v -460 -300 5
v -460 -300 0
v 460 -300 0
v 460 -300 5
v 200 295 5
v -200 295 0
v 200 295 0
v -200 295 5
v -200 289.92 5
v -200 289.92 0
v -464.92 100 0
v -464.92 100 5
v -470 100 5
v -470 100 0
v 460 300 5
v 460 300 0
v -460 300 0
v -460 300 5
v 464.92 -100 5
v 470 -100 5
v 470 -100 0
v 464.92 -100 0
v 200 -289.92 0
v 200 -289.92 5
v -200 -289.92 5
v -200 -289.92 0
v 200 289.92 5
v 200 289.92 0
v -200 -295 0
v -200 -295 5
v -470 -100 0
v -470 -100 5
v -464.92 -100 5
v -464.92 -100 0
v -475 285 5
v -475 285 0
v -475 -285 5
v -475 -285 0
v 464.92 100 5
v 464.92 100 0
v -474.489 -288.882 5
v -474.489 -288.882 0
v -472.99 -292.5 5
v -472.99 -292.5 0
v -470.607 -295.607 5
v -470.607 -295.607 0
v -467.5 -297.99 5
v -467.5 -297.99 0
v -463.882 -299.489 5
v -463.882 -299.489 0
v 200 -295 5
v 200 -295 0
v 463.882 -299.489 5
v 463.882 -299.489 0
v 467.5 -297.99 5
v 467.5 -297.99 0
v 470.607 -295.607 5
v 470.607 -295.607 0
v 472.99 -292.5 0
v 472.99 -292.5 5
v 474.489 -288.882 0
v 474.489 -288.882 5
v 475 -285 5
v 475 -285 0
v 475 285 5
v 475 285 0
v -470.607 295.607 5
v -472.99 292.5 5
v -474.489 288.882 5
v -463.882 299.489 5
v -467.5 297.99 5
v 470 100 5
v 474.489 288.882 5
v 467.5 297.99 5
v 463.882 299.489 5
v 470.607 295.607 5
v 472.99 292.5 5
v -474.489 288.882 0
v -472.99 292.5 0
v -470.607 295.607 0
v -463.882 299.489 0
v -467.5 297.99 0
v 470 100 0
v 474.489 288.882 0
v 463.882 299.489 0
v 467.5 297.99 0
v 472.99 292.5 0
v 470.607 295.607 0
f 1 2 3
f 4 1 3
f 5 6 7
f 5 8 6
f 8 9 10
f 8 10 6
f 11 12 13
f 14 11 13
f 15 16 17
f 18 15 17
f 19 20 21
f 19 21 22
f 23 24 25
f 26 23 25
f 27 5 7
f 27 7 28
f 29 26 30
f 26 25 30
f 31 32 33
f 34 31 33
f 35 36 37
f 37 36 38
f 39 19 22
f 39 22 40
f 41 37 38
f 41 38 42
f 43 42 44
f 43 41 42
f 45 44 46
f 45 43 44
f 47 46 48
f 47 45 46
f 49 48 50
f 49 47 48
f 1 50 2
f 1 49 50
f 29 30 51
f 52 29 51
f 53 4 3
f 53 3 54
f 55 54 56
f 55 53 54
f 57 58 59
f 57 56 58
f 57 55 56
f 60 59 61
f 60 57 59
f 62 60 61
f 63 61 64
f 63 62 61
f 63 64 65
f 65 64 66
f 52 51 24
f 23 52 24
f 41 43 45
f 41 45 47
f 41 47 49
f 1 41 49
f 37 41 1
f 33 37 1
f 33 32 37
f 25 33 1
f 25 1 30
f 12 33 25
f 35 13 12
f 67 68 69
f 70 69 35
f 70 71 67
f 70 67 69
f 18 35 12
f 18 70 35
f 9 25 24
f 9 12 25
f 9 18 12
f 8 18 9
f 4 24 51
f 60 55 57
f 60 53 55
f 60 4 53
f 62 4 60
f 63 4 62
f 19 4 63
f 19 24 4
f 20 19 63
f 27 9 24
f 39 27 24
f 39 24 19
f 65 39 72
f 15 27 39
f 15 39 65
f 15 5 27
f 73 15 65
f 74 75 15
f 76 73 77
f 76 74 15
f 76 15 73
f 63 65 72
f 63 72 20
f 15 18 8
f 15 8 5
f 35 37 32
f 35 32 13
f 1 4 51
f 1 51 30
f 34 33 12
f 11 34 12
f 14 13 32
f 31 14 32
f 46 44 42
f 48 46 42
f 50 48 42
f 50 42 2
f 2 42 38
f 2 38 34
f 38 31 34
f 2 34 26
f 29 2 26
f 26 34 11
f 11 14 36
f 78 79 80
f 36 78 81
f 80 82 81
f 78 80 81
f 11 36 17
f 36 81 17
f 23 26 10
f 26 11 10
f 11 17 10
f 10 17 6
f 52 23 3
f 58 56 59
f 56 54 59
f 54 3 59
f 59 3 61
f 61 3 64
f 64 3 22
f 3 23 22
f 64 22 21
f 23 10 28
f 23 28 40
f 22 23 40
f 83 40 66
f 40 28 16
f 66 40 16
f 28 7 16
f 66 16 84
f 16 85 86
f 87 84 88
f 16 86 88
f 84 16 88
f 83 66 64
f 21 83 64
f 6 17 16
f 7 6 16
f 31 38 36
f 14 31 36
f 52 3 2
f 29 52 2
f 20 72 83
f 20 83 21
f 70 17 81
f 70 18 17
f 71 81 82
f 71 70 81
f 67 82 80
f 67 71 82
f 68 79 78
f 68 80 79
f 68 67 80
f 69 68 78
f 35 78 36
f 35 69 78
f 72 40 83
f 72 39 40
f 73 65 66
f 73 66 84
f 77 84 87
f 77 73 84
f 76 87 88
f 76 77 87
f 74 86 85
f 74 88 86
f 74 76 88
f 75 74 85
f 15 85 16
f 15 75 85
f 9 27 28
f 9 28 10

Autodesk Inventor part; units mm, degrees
ref_plane "YZ Plane" through (0, 0, 0) normal (1, 0, 0) x (0, 1, 0)
ref_plane "XZ Plane" through (0, 0, 0) normal (0, 1, 0) x (-1, 0, 0)
ref_plane "XY Plane" through (0, 0, 0) normal (0, 0, 1) x (1, 0, 0)
sketch "Sketch1" plane through (0, 0, 0) normal (0, 0, 1) x (1, 0, 0)
  line L0 (-475, -300) -> (475, -300)
  line L1 (475, -300) -> (475, 300)
  line L2 (475, 300) -> (-475, 300)
  line L3 (-475, 300) -> (-475, -300)
  line L4 (-475, -300) -> (475, 300) construction
  line L5 (475, -300) -> (-475, 300) construction
  point P0 (0, 0)
  dimension "d0" = 950
  dimension "d1" = 600
extrude "Plate1" add sketch "Sketch1" along normal blind 5
fillet "Corner Round1" radius 15 4 edges at (475, 300, 2.5) (475, -300, 2.5) (-475, -300, 2.5) (-475, 300, 2.5)
sketch "Sketch2" plane through (0, 0, 5) normal (0, 0, 1) x (1, 0, 0)
  line L0 (-475, 300) -> (-475, -300)
  line L1 (-475, 0) -> (475, 0)
  line L2 (475, -300) -> (475, 300)
  line L3 (475, 300) -> (-475, 300)
  line L4 (0, 300) -> (0, -300)
  line L5 (475, -300) -> (-475, -300)
  line L6 (-200, 295) -> (200, 295)
  line L7 (200, 295) -> (200, 289.92)
  line L8 (200, 289.92) -> (-200, 289.92)
  line L9 (-200, 289.92) -> (-200, 295)
  line L10 (-200, 295) -> (200, 289.92) construction
  line L11 (200, 295) -> (-200, 289.92) construction
  line L12 (-475, 300) -> (475, 300)
  line L13 (-470, -100) -> (-464.92, -100)
  line L14 (-464.92, -100) -> (-464.92, 100)
  line L15 (-464.92, 100) -> (-470, 100)
  line L16 (-470, 100) -> (-470, -100)
  line L17 (-470, -100) -> (-464.92, 100) construction
  line L18 (-464.92, -100) -> (-470, 100) construction
  line L19 (-475, -300) -> (-475, 300)
  line L20 (-200, -289.92) -> (-200, -295)
  line L21 (-200, -295) -> (200, -295)
  line L22 (200, -295) -> (200, -289.92)
  line L23 (-200, -295) -> (200, -289.92) construction
  line L24 (200, -295) -> (-200, -289.92) construction
  line L25 (200, -289.92) -> (-200, -289.92)
  line L26 (464.92, 100) -> (470, 100)
  line L27 (464.92, -100) -> (464.92, 100)
  line L28 (470, -100) -> (464.92, 100) construction
  line L29 (470, -100) -> (464.92, -100)
  line L30 (464.92, -100) -> (470, 100) construction
  line L31 (470, 100) -> (470, -100)
  point P0 (0, 0)
  point P1 (44.3571, 22.9179)
  point P2 (0, 292.46)
  point P3 (0, 295)
  point P4 (-467.46, 0)
  point P5 (-470, 0)
  point P6 (0, -292.46)
  point P7 (0, -295)
  point P8 (0, -300)
  point P9 (0, -300)
  point P10 (467.46, 0)
  point P11 (470, 0)
  point P12 (0, 0)
  dimension "d4" = 5.08
  dimension "d5" = 400
  dimension "d6" = 5
  dimension "d7" = 5.08
  dimension "d8" = 200
  dimension "d9" = 5
  dimension "d10" = 950
  dimension "d11" = 600
extrude "Cut1" cut sketch "Sketch2" against normal blind 5 contours L16 L15 L14 L1 | L1 L14 L13 L16 | L6 L7 L8 L4 | L4 L8 L9 L6 | L21 L20 L25 L4 | L4 L25 L22 L21 | L31 L29 L27 L1 | L1 L27 L26 L31
equation "\"d14\" = Thickness"
equation "\"d2\" = Thickness"
equation "\"BendRadius\" = Thickness"
equation "\"BendReliefWidth\" = Thickness"
equation "\"BendReliefDepth\" = 0.5 * Thickness"
equation "\"TransitionRadius\" = BendRadius"
equation "\"JacobiRadiusSize\" = BendRadius"
equation "\"GapSize\" = Thickness"
equation "\"Thickness\" = 5"
properties part number "Base Full Game"
